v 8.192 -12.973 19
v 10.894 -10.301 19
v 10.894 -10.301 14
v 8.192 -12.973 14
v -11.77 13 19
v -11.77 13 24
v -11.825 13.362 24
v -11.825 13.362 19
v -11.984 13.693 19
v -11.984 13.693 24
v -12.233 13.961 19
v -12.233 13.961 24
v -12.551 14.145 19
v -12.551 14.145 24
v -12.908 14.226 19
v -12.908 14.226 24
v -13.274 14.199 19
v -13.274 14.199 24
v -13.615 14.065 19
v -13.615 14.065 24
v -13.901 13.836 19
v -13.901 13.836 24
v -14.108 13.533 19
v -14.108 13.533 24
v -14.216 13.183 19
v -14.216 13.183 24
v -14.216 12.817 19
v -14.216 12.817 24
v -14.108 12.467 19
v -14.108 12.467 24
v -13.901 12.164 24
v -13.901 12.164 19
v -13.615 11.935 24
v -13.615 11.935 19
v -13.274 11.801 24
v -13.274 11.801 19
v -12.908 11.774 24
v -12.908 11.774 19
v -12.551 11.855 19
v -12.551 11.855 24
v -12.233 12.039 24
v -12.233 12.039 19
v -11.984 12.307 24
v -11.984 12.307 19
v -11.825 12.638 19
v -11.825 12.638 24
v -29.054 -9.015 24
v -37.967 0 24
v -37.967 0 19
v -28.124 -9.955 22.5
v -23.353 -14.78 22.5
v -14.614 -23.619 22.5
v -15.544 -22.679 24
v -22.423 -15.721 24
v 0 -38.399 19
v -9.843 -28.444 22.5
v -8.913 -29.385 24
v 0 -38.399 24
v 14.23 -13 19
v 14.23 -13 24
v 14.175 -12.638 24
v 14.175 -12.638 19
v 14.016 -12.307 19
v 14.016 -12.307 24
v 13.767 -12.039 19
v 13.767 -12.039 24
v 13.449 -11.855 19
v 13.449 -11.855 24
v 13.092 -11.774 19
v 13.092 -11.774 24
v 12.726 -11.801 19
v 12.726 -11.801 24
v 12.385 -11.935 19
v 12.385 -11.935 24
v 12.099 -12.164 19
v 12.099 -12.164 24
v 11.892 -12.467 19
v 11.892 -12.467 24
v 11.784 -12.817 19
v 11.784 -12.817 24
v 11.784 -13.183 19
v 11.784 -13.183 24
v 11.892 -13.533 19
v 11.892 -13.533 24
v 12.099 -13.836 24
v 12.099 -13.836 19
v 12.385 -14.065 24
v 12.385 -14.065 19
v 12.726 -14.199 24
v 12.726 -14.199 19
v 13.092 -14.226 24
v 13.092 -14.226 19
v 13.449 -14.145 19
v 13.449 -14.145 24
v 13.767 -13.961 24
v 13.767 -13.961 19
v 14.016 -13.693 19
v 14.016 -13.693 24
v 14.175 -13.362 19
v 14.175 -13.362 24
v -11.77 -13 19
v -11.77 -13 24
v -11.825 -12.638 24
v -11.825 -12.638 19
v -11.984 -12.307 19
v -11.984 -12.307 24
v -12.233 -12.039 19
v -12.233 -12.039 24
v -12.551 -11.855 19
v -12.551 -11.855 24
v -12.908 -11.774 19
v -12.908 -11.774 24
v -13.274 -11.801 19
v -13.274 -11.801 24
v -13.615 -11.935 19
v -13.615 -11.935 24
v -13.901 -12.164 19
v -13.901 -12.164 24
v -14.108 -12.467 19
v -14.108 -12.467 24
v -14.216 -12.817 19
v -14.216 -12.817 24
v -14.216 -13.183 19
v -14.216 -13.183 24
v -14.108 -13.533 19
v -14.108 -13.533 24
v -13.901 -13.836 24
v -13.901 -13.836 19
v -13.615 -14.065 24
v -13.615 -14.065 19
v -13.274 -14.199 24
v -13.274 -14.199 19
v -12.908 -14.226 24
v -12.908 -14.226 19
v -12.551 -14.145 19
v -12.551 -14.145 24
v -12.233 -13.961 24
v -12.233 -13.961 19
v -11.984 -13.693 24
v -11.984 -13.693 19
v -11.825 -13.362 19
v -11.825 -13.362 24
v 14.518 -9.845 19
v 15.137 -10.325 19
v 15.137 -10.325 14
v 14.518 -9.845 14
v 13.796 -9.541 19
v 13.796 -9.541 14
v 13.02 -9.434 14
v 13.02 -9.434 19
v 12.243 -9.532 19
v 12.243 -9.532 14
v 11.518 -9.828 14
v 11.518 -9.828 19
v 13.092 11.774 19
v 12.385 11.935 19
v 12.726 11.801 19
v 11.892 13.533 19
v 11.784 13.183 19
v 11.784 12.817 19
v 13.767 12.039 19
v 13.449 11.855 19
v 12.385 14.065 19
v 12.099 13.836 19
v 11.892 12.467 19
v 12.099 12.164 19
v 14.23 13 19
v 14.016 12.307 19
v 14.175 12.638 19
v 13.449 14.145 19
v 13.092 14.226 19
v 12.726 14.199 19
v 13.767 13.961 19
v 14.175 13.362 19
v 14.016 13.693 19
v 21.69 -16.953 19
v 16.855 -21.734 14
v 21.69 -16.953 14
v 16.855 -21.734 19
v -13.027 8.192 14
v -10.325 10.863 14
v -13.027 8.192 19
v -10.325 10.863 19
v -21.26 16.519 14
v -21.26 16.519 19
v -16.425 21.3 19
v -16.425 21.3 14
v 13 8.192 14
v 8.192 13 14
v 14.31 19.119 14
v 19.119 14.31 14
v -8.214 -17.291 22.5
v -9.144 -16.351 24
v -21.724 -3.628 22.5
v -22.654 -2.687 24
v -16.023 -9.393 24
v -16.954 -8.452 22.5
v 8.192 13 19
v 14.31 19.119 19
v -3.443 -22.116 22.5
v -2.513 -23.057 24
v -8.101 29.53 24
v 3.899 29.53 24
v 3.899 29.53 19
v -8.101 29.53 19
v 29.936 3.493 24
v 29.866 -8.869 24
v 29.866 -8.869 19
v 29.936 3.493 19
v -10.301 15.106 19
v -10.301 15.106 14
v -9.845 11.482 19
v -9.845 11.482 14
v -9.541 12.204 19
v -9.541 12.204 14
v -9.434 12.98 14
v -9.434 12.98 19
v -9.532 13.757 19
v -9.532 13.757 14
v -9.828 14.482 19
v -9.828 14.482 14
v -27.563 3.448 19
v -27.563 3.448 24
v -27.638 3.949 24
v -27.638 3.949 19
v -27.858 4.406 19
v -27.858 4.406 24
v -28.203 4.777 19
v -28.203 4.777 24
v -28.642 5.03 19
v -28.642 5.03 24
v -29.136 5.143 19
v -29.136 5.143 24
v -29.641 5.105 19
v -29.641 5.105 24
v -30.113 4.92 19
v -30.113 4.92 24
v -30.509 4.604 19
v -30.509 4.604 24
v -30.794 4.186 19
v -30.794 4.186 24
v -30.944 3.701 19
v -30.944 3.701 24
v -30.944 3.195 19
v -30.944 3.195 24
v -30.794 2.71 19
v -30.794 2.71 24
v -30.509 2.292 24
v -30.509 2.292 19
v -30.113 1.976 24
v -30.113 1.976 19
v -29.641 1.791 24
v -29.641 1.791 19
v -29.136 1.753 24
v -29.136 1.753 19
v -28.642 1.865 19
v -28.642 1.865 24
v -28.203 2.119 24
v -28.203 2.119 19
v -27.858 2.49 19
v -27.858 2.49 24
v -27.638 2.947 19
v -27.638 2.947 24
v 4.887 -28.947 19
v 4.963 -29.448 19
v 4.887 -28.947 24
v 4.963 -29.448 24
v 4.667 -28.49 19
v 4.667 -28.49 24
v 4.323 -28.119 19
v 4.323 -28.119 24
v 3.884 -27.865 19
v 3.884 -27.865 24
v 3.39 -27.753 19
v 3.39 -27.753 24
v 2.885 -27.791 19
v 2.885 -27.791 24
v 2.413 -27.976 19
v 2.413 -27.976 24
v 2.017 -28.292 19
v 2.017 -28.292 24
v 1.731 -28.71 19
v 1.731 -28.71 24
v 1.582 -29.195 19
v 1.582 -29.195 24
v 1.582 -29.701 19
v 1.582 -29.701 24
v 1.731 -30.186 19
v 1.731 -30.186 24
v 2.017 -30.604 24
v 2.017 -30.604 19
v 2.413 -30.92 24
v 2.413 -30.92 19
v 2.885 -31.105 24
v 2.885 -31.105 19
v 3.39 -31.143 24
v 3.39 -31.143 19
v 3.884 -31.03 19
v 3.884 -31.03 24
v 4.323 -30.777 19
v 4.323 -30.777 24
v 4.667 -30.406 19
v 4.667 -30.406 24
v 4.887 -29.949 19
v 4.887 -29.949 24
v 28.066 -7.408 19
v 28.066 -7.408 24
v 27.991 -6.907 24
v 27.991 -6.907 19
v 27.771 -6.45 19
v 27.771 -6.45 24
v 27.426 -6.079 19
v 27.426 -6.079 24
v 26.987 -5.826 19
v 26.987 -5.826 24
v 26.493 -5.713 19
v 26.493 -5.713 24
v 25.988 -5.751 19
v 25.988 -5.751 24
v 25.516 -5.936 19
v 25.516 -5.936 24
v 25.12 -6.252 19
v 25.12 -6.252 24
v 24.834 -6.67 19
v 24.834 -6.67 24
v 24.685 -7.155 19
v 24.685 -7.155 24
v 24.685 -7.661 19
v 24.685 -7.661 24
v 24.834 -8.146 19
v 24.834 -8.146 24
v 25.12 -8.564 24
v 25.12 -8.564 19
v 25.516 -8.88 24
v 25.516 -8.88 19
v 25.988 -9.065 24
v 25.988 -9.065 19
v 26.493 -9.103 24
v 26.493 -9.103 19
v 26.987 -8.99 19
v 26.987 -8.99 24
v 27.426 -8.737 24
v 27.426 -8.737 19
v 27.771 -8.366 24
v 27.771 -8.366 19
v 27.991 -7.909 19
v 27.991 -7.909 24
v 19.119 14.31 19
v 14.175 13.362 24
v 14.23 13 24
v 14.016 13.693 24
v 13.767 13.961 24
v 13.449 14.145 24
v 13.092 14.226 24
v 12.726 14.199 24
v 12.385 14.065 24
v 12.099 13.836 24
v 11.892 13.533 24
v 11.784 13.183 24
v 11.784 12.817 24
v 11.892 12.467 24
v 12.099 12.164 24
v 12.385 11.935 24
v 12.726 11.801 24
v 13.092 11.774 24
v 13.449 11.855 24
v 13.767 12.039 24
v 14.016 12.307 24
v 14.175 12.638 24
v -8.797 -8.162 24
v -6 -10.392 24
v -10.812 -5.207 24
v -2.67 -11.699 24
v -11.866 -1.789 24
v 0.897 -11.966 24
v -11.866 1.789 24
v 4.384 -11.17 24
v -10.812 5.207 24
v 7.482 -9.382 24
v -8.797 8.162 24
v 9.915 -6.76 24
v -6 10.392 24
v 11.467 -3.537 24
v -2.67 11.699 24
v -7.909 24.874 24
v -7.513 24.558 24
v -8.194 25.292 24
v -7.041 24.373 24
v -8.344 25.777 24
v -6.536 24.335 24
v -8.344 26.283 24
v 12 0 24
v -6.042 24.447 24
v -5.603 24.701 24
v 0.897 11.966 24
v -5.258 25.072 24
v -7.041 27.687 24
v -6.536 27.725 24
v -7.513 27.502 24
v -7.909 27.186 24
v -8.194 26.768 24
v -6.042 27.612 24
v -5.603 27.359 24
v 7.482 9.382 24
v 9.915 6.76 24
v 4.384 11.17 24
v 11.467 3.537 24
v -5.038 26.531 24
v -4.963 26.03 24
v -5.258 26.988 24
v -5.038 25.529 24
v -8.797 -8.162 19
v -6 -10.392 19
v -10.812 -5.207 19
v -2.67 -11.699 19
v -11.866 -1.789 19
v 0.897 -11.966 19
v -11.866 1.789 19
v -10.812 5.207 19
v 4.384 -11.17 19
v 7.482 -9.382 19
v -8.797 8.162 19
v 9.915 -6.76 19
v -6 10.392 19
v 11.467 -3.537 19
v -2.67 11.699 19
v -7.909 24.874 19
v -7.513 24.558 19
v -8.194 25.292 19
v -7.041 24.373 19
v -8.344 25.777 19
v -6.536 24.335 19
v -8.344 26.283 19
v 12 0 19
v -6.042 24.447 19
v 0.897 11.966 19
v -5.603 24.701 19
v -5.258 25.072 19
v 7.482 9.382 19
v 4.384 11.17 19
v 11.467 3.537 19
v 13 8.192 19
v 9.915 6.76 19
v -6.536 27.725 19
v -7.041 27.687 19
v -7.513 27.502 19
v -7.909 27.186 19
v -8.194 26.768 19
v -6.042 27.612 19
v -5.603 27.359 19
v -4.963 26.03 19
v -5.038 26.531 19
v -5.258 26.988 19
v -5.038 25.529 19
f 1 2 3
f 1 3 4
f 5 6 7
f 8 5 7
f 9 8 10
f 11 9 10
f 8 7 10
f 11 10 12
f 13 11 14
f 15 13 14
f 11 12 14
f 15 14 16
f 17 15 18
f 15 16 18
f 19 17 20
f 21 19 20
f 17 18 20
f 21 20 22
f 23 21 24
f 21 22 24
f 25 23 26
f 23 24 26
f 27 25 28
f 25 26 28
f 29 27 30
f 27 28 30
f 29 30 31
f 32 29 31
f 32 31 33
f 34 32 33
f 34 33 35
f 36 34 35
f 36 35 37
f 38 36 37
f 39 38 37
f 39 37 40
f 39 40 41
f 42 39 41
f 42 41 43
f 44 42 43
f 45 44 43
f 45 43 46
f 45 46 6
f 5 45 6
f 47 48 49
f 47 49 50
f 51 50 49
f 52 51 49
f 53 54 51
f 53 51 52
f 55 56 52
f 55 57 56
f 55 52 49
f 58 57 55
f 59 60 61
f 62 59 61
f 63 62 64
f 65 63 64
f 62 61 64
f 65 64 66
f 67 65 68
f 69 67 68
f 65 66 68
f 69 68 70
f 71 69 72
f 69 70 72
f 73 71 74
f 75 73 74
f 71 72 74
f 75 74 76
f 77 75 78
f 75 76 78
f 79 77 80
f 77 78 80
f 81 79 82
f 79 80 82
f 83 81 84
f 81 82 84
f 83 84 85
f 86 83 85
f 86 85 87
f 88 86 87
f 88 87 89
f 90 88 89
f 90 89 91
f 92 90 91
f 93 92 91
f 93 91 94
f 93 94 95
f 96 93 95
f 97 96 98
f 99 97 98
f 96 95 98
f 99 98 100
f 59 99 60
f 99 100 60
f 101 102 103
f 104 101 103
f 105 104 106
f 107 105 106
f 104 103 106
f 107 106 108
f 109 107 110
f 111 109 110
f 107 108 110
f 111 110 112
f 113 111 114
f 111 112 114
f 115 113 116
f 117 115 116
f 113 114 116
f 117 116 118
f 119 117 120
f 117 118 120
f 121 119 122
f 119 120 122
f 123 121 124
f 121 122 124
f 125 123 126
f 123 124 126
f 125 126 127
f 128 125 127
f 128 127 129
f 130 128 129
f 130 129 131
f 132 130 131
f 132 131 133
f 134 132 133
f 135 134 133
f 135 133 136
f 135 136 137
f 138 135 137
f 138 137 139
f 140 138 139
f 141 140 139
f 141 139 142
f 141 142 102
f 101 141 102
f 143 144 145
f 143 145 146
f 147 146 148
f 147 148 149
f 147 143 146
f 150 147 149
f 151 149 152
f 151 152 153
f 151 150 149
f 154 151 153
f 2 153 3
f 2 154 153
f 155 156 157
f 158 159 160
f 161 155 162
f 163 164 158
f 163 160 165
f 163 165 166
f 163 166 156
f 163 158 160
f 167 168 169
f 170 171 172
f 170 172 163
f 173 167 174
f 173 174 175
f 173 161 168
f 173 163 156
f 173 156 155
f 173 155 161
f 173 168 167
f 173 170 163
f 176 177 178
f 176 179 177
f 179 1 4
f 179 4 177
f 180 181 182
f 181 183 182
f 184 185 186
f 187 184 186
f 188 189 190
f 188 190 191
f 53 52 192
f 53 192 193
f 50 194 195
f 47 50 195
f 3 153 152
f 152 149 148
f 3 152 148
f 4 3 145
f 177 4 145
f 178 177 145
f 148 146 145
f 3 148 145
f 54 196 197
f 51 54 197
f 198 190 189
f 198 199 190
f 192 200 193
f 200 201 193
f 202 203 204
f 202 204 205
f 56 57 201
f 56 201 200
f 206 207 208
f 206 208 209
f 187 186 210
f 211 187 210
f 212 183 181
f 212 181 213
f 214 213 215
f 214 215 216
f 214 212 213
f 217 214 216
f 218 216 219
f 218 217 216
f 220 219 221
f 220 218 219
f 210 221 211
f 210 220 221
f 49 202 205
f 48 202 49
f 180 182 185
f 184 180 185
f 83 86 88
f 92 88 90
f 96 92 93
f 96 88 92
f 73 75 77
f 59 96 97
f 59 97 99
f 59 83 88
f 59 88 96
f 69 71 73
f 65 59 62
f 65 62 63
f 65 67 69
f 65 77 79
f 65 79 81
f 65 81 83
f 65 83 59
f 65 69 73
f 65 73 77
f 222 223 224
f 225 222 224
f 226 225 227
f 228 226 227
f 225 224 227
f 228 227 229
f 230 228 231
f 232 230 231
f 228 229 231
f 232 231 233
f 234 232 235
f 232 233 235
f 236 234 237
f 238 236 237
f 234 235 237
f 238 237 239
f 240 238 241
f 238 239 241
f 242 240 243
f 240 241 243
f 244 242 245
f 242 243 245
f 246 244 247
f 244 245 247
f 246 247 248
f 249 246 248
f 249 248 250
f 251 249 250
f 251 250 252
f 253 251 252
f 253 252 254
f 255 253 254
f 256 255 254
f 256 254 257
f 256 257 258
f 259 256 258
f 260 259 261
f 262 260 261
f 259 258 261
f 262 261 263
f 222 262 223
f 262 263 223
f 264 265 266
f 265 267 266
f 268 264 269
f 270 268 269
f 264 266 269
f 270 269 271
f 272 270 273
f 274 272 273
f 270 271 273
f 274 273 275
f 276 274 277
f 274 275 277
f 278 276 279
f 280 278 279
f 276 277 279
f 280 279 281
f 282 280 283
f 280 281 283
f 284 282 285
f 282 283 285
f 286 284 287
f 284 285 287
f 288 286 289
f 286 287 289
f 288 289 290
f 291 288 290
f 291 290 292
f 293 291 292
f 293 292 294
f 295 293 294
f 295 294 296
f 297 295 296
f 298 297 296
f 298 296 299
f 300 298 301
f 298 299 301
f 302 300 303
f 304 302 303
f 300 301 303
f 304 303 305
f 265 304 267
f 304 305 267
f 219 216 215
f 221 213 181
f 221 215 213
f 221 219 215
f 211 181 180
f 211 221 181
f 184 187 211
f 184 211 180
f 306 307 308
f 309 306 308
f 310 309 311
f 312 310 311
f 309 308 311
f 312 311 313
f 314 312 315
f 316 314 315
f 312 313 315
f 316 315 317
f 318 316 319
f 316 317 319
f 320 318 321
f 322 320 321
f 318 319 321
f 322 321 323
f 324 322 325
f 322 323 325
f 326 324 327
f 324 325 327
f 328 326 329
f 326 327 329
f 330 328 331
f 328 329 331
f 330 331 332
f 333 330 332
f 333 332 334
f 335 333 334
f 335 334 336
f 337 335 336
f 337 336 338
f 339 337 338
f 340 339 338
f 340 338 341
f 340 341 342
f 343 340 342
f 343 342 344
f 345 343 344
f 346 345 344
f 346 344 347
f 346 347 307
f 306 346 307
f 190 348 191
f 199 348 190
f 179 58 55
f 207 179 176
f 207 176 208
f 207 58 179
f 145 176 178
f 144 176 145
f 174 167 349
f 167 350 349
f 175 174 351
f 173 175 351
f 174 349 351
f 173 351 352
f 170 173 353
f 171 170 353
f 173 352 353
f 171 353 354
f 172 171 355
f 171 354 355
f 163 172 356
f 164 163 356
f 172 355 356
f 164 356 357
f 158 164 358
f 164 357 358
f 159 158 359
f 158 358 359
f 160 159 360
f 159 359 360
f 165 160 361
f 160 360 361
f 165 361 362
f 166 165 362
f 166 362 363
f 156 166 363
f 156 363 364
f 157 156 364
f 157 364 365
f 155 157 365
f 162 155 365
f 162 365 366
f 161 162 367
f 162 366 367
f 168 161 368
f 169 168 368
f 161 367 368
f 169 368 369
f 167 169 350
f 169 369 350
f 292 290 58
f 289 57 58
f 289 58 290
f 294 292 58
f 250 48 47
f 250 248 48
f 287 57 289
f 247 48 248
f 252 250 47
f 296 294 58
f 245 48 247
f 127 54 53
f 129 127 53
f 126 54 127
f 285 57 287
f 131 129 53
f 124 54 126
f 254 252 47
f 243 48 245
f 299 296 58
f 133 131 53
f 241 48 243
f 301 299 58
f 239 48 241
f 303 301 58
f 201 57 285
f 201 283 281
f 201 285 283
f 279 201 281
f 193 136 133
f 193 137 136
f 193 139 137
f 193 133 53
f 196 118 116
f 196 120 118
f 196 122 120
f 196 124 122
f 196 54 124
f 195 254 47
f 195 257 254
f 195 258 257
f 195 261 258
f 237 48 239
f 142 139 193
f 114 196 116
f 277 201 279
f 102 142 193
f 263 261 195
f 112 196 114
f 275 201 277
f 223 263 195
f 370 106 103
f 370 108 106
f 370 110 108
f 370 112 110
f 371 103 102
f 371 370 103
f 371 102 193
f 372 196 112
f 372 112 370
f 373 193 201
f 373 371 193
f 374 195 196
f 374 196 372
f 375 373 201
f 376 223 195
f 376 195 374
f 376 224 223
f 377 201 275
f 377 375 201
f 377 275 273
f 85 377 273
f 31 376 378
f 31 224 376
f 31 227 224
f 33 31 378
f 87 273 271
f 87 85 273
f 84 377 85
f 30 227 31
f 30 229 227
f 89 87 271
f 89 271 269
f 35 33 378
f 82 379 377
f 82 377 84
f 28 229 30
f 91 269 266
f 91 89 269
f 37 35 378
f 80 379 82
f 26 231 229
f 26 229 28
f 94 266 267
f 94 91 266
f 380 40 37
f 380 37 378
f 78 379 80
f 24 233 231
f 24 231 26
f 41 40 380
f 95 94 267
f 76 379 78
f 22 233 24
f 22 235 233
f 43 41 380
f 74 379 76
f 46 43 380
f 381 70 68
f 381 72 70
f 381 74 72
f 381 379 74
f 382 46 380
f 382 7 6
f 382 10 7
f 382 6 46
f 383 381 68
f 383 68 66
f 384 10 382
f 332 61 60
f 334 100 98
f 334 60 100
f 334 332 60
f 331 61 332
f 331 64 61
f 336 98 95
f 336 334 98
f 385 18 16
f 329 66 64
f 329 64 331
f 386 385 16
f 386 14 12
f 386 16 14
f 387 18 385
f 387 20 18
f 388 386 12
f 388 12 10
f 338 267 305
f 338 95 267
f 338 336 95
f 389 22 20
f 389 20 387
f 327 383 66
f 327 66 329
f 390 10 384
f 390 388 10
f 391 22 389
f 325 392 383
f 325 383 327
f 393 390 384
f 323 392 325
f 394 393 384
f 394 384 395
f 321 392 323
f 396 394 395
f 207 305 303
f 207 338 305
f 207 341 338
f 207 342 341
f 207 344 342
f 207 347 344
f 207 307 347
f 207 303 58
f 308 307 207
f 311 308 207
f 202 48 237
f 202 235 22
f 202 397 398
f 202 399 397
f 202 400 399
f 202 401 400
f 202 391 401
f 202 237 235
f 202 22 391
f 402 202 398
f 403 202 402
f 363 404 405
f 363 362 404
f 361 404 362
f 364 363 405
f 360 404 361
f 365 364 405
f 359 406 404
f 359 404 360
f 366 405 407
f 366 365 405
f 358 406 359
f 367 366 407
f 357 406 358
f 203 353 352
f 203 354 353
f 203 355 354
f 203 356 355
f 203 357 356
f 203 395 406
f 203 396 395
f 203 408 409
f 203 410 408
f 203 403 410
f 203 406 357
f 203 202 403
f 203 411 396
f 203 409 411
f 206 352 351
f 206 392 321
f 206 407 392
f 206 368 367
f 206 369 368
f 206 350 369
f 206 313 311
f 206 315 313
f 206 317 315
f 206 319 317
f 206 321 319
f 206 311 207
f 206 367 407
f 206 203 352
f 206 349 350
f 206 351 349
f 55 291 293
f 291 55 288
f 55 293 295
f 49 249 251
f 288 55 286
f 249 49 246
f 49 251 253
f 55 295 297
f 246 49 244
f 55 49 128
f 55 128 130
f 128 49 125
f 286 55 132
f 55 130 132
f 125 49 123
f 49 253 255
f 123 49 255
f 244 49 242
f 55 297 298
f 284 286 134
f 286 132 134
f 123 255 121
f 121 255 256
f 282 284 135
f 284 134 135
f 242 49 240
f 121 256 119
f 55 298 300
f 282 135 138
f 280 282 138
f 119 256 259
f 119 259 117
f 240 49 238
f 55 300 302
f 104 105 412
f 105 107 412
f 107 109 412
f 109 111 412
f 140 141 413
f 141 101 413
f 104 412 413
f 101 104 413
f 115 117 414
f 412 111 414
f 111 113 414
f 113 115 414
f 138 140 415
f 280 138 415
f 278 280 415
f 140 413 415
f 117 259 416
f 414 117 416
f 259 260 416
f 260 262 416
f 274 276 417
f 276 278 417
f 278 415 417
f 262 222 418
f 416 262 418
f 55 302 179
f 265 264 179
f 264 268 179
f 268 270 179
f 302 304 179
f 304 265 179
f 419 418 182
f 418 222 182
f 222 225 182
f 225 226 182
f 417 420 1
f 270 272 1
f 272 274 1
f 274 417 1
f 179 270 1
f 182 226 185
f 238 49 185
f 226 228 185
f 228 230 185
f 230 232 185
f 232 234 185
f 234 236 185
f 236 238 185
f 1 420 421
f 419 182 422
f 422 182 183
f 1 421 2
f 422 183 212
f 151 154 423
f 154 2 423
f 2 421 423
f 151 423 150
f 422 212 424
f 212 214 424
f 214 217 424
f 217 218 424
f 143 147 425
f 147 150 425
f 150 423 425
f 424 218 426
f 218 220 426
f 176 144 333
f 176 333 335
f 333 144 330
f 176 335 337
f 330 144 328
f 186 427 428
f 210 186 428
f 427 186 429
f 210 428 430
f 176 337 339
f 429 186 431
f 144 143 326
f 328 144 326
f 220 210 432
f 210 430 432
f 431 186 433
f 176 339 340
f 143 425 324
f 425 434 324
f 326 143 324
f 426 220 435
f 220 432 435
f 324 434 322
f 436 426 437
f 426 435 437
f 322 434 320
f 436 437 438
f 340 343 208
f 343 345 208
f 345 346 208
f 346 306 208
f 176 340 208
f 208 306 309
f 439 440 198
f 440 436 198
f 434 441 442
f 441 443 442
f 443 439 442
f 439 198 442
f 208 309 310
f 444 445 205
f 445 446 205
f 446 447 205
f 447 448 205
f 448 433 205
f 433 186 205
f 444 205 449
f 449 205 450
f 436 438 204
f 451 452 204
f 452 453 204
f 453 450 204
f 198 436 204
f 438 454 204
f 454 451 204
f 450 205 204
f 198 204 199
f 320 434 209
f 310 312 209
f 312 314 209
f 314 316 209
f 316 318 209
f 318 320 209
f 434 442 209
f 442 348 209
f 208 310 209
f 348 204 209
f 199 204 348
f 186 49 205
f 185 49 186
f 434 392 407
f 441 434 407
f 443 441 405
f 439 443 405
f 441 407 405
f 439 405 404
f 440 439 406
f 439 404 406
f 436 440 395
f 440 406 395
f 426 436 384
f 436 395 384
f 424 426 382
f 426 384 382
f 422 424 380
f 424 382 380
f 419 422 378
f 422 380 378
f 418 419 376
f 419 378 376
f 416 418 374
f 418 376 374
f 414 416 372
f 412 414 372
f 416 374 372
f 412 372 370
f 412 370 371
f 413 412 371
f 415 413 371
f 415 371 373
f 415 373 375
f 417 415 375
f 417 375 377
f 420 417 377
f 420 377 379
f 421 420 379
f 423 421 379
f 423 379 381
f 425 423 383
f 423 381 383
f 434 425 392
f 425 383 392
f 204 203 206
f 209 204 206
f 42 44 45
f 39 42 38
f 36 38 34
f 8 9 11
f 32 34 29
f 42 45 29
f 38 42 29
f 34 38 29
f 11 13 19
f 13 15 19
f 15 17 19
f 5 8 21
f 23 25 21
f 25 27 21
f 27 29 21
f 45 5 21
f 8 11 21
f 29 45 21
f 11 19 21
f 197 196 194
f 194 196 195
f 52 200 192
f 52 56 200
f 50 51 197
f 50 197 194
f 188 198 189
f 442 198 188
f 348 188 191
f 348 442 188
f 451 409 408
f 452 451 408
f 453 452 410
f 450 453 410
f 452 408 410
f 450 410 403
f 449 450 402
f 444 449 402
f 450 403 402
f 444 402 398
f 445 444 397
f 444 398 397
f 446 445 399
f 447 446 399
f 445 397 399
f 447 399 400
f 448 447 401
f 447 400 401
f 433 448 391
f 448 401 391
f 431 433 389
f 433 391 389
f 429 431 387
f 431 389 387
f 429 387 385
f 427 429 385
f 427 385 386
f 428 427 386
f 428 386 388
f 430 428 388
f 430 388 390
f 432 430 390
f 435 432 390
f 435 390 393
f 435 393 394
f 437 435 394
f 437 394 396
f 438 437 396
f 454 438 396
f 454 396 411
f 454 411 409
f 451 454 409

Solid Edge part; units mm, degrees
sketch "Sketch1" plane through (0, 0, 24) normal (0, 0, 1) x (1, 0, 0)
  circle A0 centre (-13, 13) radius 1.2295
  circle A1 centre (13, 13) radius 1.2295
  circle A2 centre (13, -13) radius 1.2295
  circle A3 centre (-13, -13) radius 1.2295
  circle A4 centre (0, 0) radius 12
  circle A5 centre (-6.6628, 26.0299) radius 1.7
  circle A6 centre (26.3661, -7.408) radius 1.7
  circle A7 centre (-29.2628, 3.4479) radius 1.7
  circle A8 centre (3.2628, -29.4479) radius 1.7
  line L0 (0, -38.3993) -> (29.8661, -8.8693)
  line L1 (29.8661, -8.8693) -> (29.9361, 3.4929)
  line L2 (3.899, 29.5299) -> (29.9361, 3.4929)
  line L3 (3.899, 29.5299) -> (-8.101, 29.5299)
  line L4 (-8.101, 29.5299) -> (-37.9671, 0)
  line L5 (-37.9671, 0) -> (0, -38.3993)
  dimension "D1" = 54
  dimension "D2" = 13
  dimension "D3" = 1
  dimension "D4" = 3.4
  dimension "D5" = 20
  dimension "D6" = 30
  dimension "D7" = 10
  dimension "D8" = 7.1
  dimension "D9" = 3.5
  dimension "D10" = 3.5
  dimension "D11" = 42
  dimension "D12" = 42
  dimension "D13" = 3.5
  dimension "D14" = 3.5
extrude "ExtrudedProtrusion_2" add sketch "Sketch1" against normal blind 5
sketch "Sketch2" plane through (-3.908, -4.4218, 19) normal (0, 0, -1) x (-0.7111, -0.7031, 0)
  line L0 (-2.3838, 27.091) -> (-9.1838, 27.091)
  line L1 (-9.1838, 27.091) -> (-9.1838, 18.3811)
  arc A0 (-6.1838, 15.3811) -> (-9.1838, 18.3811) centre (-6.1838, 18.3811) cw
  line L2 (-6.1838, 15.3811) -> (-2.3838, 15.3811)
  line L3 (-2.3838, 15.3811) -> (-2.3838, 27.091)
  line L4 (-2.5919, -26.909) -> (-9.3919, -26.909)
  line L5 (-9.3919, -26.909) -> (-9.3919, -17.5879)
  arc A1 (-9.3919, -17.5879) -> (-6.3919, -14.5879) centre (-6.3919, -17.5879) cw
  line L6 (-6.3919, -14.5879) -> (-2.5919, -14.5879)
  line L7 (-2.5919, -14.5879) -> (-2.5919, -26.909)
  line L8 (-29.5446, -2.8696) -> (-29.5061, 3.9303)
  line L9 (-29.5061, 3.9303) -> (-20.8532, 3.8814)
  line L10 (-20.8532, 3.8814) -> (-20.8917, -2.9185)
  line L11 (-20.8917, -2.9185) -> (-29.5446, -2.8696)
extrude "ExtrudedProtrusion_4" add sketch "Sketch2" along normal blind 5
sketch "Sketch3" plane through (-18.9835, -19.1996, 21.5) normal (-0.7111, -0.7031, 0) x (-0.7031, 0.7111, 0)
  line L0 (-14.3229, -2.5) -> (-13, -1)
  line L1 (-13, -1) -> (-6.2152, -1)
  line L2 (-6.2152, -1) -> (-4.8924, -2.5)
  line L3 (-4.8924, -2.5) -> (-14.3229, -2.5)
  line L4 (14.3229, -2.5) -> (4.8924, -2.5)
  line L5 (4.8924, -2.5) -> (6.2152, -1)
  line L6 (6.2152, -1) -> (13, -1)
  line L7 (13, -1) -> (14.3229, -2.5)
  dimension "D1" = 1.5
  dimension "D2" = 1.5
  dimension "D3" = 14
  dimension "D4" = 14
  dimension "D5" = 2
  dimension "D6" = 2
extrude "Cutout1" cut sketch "Sketch3" against normal blind 9
properties material "ABS Plastic, high impact"
